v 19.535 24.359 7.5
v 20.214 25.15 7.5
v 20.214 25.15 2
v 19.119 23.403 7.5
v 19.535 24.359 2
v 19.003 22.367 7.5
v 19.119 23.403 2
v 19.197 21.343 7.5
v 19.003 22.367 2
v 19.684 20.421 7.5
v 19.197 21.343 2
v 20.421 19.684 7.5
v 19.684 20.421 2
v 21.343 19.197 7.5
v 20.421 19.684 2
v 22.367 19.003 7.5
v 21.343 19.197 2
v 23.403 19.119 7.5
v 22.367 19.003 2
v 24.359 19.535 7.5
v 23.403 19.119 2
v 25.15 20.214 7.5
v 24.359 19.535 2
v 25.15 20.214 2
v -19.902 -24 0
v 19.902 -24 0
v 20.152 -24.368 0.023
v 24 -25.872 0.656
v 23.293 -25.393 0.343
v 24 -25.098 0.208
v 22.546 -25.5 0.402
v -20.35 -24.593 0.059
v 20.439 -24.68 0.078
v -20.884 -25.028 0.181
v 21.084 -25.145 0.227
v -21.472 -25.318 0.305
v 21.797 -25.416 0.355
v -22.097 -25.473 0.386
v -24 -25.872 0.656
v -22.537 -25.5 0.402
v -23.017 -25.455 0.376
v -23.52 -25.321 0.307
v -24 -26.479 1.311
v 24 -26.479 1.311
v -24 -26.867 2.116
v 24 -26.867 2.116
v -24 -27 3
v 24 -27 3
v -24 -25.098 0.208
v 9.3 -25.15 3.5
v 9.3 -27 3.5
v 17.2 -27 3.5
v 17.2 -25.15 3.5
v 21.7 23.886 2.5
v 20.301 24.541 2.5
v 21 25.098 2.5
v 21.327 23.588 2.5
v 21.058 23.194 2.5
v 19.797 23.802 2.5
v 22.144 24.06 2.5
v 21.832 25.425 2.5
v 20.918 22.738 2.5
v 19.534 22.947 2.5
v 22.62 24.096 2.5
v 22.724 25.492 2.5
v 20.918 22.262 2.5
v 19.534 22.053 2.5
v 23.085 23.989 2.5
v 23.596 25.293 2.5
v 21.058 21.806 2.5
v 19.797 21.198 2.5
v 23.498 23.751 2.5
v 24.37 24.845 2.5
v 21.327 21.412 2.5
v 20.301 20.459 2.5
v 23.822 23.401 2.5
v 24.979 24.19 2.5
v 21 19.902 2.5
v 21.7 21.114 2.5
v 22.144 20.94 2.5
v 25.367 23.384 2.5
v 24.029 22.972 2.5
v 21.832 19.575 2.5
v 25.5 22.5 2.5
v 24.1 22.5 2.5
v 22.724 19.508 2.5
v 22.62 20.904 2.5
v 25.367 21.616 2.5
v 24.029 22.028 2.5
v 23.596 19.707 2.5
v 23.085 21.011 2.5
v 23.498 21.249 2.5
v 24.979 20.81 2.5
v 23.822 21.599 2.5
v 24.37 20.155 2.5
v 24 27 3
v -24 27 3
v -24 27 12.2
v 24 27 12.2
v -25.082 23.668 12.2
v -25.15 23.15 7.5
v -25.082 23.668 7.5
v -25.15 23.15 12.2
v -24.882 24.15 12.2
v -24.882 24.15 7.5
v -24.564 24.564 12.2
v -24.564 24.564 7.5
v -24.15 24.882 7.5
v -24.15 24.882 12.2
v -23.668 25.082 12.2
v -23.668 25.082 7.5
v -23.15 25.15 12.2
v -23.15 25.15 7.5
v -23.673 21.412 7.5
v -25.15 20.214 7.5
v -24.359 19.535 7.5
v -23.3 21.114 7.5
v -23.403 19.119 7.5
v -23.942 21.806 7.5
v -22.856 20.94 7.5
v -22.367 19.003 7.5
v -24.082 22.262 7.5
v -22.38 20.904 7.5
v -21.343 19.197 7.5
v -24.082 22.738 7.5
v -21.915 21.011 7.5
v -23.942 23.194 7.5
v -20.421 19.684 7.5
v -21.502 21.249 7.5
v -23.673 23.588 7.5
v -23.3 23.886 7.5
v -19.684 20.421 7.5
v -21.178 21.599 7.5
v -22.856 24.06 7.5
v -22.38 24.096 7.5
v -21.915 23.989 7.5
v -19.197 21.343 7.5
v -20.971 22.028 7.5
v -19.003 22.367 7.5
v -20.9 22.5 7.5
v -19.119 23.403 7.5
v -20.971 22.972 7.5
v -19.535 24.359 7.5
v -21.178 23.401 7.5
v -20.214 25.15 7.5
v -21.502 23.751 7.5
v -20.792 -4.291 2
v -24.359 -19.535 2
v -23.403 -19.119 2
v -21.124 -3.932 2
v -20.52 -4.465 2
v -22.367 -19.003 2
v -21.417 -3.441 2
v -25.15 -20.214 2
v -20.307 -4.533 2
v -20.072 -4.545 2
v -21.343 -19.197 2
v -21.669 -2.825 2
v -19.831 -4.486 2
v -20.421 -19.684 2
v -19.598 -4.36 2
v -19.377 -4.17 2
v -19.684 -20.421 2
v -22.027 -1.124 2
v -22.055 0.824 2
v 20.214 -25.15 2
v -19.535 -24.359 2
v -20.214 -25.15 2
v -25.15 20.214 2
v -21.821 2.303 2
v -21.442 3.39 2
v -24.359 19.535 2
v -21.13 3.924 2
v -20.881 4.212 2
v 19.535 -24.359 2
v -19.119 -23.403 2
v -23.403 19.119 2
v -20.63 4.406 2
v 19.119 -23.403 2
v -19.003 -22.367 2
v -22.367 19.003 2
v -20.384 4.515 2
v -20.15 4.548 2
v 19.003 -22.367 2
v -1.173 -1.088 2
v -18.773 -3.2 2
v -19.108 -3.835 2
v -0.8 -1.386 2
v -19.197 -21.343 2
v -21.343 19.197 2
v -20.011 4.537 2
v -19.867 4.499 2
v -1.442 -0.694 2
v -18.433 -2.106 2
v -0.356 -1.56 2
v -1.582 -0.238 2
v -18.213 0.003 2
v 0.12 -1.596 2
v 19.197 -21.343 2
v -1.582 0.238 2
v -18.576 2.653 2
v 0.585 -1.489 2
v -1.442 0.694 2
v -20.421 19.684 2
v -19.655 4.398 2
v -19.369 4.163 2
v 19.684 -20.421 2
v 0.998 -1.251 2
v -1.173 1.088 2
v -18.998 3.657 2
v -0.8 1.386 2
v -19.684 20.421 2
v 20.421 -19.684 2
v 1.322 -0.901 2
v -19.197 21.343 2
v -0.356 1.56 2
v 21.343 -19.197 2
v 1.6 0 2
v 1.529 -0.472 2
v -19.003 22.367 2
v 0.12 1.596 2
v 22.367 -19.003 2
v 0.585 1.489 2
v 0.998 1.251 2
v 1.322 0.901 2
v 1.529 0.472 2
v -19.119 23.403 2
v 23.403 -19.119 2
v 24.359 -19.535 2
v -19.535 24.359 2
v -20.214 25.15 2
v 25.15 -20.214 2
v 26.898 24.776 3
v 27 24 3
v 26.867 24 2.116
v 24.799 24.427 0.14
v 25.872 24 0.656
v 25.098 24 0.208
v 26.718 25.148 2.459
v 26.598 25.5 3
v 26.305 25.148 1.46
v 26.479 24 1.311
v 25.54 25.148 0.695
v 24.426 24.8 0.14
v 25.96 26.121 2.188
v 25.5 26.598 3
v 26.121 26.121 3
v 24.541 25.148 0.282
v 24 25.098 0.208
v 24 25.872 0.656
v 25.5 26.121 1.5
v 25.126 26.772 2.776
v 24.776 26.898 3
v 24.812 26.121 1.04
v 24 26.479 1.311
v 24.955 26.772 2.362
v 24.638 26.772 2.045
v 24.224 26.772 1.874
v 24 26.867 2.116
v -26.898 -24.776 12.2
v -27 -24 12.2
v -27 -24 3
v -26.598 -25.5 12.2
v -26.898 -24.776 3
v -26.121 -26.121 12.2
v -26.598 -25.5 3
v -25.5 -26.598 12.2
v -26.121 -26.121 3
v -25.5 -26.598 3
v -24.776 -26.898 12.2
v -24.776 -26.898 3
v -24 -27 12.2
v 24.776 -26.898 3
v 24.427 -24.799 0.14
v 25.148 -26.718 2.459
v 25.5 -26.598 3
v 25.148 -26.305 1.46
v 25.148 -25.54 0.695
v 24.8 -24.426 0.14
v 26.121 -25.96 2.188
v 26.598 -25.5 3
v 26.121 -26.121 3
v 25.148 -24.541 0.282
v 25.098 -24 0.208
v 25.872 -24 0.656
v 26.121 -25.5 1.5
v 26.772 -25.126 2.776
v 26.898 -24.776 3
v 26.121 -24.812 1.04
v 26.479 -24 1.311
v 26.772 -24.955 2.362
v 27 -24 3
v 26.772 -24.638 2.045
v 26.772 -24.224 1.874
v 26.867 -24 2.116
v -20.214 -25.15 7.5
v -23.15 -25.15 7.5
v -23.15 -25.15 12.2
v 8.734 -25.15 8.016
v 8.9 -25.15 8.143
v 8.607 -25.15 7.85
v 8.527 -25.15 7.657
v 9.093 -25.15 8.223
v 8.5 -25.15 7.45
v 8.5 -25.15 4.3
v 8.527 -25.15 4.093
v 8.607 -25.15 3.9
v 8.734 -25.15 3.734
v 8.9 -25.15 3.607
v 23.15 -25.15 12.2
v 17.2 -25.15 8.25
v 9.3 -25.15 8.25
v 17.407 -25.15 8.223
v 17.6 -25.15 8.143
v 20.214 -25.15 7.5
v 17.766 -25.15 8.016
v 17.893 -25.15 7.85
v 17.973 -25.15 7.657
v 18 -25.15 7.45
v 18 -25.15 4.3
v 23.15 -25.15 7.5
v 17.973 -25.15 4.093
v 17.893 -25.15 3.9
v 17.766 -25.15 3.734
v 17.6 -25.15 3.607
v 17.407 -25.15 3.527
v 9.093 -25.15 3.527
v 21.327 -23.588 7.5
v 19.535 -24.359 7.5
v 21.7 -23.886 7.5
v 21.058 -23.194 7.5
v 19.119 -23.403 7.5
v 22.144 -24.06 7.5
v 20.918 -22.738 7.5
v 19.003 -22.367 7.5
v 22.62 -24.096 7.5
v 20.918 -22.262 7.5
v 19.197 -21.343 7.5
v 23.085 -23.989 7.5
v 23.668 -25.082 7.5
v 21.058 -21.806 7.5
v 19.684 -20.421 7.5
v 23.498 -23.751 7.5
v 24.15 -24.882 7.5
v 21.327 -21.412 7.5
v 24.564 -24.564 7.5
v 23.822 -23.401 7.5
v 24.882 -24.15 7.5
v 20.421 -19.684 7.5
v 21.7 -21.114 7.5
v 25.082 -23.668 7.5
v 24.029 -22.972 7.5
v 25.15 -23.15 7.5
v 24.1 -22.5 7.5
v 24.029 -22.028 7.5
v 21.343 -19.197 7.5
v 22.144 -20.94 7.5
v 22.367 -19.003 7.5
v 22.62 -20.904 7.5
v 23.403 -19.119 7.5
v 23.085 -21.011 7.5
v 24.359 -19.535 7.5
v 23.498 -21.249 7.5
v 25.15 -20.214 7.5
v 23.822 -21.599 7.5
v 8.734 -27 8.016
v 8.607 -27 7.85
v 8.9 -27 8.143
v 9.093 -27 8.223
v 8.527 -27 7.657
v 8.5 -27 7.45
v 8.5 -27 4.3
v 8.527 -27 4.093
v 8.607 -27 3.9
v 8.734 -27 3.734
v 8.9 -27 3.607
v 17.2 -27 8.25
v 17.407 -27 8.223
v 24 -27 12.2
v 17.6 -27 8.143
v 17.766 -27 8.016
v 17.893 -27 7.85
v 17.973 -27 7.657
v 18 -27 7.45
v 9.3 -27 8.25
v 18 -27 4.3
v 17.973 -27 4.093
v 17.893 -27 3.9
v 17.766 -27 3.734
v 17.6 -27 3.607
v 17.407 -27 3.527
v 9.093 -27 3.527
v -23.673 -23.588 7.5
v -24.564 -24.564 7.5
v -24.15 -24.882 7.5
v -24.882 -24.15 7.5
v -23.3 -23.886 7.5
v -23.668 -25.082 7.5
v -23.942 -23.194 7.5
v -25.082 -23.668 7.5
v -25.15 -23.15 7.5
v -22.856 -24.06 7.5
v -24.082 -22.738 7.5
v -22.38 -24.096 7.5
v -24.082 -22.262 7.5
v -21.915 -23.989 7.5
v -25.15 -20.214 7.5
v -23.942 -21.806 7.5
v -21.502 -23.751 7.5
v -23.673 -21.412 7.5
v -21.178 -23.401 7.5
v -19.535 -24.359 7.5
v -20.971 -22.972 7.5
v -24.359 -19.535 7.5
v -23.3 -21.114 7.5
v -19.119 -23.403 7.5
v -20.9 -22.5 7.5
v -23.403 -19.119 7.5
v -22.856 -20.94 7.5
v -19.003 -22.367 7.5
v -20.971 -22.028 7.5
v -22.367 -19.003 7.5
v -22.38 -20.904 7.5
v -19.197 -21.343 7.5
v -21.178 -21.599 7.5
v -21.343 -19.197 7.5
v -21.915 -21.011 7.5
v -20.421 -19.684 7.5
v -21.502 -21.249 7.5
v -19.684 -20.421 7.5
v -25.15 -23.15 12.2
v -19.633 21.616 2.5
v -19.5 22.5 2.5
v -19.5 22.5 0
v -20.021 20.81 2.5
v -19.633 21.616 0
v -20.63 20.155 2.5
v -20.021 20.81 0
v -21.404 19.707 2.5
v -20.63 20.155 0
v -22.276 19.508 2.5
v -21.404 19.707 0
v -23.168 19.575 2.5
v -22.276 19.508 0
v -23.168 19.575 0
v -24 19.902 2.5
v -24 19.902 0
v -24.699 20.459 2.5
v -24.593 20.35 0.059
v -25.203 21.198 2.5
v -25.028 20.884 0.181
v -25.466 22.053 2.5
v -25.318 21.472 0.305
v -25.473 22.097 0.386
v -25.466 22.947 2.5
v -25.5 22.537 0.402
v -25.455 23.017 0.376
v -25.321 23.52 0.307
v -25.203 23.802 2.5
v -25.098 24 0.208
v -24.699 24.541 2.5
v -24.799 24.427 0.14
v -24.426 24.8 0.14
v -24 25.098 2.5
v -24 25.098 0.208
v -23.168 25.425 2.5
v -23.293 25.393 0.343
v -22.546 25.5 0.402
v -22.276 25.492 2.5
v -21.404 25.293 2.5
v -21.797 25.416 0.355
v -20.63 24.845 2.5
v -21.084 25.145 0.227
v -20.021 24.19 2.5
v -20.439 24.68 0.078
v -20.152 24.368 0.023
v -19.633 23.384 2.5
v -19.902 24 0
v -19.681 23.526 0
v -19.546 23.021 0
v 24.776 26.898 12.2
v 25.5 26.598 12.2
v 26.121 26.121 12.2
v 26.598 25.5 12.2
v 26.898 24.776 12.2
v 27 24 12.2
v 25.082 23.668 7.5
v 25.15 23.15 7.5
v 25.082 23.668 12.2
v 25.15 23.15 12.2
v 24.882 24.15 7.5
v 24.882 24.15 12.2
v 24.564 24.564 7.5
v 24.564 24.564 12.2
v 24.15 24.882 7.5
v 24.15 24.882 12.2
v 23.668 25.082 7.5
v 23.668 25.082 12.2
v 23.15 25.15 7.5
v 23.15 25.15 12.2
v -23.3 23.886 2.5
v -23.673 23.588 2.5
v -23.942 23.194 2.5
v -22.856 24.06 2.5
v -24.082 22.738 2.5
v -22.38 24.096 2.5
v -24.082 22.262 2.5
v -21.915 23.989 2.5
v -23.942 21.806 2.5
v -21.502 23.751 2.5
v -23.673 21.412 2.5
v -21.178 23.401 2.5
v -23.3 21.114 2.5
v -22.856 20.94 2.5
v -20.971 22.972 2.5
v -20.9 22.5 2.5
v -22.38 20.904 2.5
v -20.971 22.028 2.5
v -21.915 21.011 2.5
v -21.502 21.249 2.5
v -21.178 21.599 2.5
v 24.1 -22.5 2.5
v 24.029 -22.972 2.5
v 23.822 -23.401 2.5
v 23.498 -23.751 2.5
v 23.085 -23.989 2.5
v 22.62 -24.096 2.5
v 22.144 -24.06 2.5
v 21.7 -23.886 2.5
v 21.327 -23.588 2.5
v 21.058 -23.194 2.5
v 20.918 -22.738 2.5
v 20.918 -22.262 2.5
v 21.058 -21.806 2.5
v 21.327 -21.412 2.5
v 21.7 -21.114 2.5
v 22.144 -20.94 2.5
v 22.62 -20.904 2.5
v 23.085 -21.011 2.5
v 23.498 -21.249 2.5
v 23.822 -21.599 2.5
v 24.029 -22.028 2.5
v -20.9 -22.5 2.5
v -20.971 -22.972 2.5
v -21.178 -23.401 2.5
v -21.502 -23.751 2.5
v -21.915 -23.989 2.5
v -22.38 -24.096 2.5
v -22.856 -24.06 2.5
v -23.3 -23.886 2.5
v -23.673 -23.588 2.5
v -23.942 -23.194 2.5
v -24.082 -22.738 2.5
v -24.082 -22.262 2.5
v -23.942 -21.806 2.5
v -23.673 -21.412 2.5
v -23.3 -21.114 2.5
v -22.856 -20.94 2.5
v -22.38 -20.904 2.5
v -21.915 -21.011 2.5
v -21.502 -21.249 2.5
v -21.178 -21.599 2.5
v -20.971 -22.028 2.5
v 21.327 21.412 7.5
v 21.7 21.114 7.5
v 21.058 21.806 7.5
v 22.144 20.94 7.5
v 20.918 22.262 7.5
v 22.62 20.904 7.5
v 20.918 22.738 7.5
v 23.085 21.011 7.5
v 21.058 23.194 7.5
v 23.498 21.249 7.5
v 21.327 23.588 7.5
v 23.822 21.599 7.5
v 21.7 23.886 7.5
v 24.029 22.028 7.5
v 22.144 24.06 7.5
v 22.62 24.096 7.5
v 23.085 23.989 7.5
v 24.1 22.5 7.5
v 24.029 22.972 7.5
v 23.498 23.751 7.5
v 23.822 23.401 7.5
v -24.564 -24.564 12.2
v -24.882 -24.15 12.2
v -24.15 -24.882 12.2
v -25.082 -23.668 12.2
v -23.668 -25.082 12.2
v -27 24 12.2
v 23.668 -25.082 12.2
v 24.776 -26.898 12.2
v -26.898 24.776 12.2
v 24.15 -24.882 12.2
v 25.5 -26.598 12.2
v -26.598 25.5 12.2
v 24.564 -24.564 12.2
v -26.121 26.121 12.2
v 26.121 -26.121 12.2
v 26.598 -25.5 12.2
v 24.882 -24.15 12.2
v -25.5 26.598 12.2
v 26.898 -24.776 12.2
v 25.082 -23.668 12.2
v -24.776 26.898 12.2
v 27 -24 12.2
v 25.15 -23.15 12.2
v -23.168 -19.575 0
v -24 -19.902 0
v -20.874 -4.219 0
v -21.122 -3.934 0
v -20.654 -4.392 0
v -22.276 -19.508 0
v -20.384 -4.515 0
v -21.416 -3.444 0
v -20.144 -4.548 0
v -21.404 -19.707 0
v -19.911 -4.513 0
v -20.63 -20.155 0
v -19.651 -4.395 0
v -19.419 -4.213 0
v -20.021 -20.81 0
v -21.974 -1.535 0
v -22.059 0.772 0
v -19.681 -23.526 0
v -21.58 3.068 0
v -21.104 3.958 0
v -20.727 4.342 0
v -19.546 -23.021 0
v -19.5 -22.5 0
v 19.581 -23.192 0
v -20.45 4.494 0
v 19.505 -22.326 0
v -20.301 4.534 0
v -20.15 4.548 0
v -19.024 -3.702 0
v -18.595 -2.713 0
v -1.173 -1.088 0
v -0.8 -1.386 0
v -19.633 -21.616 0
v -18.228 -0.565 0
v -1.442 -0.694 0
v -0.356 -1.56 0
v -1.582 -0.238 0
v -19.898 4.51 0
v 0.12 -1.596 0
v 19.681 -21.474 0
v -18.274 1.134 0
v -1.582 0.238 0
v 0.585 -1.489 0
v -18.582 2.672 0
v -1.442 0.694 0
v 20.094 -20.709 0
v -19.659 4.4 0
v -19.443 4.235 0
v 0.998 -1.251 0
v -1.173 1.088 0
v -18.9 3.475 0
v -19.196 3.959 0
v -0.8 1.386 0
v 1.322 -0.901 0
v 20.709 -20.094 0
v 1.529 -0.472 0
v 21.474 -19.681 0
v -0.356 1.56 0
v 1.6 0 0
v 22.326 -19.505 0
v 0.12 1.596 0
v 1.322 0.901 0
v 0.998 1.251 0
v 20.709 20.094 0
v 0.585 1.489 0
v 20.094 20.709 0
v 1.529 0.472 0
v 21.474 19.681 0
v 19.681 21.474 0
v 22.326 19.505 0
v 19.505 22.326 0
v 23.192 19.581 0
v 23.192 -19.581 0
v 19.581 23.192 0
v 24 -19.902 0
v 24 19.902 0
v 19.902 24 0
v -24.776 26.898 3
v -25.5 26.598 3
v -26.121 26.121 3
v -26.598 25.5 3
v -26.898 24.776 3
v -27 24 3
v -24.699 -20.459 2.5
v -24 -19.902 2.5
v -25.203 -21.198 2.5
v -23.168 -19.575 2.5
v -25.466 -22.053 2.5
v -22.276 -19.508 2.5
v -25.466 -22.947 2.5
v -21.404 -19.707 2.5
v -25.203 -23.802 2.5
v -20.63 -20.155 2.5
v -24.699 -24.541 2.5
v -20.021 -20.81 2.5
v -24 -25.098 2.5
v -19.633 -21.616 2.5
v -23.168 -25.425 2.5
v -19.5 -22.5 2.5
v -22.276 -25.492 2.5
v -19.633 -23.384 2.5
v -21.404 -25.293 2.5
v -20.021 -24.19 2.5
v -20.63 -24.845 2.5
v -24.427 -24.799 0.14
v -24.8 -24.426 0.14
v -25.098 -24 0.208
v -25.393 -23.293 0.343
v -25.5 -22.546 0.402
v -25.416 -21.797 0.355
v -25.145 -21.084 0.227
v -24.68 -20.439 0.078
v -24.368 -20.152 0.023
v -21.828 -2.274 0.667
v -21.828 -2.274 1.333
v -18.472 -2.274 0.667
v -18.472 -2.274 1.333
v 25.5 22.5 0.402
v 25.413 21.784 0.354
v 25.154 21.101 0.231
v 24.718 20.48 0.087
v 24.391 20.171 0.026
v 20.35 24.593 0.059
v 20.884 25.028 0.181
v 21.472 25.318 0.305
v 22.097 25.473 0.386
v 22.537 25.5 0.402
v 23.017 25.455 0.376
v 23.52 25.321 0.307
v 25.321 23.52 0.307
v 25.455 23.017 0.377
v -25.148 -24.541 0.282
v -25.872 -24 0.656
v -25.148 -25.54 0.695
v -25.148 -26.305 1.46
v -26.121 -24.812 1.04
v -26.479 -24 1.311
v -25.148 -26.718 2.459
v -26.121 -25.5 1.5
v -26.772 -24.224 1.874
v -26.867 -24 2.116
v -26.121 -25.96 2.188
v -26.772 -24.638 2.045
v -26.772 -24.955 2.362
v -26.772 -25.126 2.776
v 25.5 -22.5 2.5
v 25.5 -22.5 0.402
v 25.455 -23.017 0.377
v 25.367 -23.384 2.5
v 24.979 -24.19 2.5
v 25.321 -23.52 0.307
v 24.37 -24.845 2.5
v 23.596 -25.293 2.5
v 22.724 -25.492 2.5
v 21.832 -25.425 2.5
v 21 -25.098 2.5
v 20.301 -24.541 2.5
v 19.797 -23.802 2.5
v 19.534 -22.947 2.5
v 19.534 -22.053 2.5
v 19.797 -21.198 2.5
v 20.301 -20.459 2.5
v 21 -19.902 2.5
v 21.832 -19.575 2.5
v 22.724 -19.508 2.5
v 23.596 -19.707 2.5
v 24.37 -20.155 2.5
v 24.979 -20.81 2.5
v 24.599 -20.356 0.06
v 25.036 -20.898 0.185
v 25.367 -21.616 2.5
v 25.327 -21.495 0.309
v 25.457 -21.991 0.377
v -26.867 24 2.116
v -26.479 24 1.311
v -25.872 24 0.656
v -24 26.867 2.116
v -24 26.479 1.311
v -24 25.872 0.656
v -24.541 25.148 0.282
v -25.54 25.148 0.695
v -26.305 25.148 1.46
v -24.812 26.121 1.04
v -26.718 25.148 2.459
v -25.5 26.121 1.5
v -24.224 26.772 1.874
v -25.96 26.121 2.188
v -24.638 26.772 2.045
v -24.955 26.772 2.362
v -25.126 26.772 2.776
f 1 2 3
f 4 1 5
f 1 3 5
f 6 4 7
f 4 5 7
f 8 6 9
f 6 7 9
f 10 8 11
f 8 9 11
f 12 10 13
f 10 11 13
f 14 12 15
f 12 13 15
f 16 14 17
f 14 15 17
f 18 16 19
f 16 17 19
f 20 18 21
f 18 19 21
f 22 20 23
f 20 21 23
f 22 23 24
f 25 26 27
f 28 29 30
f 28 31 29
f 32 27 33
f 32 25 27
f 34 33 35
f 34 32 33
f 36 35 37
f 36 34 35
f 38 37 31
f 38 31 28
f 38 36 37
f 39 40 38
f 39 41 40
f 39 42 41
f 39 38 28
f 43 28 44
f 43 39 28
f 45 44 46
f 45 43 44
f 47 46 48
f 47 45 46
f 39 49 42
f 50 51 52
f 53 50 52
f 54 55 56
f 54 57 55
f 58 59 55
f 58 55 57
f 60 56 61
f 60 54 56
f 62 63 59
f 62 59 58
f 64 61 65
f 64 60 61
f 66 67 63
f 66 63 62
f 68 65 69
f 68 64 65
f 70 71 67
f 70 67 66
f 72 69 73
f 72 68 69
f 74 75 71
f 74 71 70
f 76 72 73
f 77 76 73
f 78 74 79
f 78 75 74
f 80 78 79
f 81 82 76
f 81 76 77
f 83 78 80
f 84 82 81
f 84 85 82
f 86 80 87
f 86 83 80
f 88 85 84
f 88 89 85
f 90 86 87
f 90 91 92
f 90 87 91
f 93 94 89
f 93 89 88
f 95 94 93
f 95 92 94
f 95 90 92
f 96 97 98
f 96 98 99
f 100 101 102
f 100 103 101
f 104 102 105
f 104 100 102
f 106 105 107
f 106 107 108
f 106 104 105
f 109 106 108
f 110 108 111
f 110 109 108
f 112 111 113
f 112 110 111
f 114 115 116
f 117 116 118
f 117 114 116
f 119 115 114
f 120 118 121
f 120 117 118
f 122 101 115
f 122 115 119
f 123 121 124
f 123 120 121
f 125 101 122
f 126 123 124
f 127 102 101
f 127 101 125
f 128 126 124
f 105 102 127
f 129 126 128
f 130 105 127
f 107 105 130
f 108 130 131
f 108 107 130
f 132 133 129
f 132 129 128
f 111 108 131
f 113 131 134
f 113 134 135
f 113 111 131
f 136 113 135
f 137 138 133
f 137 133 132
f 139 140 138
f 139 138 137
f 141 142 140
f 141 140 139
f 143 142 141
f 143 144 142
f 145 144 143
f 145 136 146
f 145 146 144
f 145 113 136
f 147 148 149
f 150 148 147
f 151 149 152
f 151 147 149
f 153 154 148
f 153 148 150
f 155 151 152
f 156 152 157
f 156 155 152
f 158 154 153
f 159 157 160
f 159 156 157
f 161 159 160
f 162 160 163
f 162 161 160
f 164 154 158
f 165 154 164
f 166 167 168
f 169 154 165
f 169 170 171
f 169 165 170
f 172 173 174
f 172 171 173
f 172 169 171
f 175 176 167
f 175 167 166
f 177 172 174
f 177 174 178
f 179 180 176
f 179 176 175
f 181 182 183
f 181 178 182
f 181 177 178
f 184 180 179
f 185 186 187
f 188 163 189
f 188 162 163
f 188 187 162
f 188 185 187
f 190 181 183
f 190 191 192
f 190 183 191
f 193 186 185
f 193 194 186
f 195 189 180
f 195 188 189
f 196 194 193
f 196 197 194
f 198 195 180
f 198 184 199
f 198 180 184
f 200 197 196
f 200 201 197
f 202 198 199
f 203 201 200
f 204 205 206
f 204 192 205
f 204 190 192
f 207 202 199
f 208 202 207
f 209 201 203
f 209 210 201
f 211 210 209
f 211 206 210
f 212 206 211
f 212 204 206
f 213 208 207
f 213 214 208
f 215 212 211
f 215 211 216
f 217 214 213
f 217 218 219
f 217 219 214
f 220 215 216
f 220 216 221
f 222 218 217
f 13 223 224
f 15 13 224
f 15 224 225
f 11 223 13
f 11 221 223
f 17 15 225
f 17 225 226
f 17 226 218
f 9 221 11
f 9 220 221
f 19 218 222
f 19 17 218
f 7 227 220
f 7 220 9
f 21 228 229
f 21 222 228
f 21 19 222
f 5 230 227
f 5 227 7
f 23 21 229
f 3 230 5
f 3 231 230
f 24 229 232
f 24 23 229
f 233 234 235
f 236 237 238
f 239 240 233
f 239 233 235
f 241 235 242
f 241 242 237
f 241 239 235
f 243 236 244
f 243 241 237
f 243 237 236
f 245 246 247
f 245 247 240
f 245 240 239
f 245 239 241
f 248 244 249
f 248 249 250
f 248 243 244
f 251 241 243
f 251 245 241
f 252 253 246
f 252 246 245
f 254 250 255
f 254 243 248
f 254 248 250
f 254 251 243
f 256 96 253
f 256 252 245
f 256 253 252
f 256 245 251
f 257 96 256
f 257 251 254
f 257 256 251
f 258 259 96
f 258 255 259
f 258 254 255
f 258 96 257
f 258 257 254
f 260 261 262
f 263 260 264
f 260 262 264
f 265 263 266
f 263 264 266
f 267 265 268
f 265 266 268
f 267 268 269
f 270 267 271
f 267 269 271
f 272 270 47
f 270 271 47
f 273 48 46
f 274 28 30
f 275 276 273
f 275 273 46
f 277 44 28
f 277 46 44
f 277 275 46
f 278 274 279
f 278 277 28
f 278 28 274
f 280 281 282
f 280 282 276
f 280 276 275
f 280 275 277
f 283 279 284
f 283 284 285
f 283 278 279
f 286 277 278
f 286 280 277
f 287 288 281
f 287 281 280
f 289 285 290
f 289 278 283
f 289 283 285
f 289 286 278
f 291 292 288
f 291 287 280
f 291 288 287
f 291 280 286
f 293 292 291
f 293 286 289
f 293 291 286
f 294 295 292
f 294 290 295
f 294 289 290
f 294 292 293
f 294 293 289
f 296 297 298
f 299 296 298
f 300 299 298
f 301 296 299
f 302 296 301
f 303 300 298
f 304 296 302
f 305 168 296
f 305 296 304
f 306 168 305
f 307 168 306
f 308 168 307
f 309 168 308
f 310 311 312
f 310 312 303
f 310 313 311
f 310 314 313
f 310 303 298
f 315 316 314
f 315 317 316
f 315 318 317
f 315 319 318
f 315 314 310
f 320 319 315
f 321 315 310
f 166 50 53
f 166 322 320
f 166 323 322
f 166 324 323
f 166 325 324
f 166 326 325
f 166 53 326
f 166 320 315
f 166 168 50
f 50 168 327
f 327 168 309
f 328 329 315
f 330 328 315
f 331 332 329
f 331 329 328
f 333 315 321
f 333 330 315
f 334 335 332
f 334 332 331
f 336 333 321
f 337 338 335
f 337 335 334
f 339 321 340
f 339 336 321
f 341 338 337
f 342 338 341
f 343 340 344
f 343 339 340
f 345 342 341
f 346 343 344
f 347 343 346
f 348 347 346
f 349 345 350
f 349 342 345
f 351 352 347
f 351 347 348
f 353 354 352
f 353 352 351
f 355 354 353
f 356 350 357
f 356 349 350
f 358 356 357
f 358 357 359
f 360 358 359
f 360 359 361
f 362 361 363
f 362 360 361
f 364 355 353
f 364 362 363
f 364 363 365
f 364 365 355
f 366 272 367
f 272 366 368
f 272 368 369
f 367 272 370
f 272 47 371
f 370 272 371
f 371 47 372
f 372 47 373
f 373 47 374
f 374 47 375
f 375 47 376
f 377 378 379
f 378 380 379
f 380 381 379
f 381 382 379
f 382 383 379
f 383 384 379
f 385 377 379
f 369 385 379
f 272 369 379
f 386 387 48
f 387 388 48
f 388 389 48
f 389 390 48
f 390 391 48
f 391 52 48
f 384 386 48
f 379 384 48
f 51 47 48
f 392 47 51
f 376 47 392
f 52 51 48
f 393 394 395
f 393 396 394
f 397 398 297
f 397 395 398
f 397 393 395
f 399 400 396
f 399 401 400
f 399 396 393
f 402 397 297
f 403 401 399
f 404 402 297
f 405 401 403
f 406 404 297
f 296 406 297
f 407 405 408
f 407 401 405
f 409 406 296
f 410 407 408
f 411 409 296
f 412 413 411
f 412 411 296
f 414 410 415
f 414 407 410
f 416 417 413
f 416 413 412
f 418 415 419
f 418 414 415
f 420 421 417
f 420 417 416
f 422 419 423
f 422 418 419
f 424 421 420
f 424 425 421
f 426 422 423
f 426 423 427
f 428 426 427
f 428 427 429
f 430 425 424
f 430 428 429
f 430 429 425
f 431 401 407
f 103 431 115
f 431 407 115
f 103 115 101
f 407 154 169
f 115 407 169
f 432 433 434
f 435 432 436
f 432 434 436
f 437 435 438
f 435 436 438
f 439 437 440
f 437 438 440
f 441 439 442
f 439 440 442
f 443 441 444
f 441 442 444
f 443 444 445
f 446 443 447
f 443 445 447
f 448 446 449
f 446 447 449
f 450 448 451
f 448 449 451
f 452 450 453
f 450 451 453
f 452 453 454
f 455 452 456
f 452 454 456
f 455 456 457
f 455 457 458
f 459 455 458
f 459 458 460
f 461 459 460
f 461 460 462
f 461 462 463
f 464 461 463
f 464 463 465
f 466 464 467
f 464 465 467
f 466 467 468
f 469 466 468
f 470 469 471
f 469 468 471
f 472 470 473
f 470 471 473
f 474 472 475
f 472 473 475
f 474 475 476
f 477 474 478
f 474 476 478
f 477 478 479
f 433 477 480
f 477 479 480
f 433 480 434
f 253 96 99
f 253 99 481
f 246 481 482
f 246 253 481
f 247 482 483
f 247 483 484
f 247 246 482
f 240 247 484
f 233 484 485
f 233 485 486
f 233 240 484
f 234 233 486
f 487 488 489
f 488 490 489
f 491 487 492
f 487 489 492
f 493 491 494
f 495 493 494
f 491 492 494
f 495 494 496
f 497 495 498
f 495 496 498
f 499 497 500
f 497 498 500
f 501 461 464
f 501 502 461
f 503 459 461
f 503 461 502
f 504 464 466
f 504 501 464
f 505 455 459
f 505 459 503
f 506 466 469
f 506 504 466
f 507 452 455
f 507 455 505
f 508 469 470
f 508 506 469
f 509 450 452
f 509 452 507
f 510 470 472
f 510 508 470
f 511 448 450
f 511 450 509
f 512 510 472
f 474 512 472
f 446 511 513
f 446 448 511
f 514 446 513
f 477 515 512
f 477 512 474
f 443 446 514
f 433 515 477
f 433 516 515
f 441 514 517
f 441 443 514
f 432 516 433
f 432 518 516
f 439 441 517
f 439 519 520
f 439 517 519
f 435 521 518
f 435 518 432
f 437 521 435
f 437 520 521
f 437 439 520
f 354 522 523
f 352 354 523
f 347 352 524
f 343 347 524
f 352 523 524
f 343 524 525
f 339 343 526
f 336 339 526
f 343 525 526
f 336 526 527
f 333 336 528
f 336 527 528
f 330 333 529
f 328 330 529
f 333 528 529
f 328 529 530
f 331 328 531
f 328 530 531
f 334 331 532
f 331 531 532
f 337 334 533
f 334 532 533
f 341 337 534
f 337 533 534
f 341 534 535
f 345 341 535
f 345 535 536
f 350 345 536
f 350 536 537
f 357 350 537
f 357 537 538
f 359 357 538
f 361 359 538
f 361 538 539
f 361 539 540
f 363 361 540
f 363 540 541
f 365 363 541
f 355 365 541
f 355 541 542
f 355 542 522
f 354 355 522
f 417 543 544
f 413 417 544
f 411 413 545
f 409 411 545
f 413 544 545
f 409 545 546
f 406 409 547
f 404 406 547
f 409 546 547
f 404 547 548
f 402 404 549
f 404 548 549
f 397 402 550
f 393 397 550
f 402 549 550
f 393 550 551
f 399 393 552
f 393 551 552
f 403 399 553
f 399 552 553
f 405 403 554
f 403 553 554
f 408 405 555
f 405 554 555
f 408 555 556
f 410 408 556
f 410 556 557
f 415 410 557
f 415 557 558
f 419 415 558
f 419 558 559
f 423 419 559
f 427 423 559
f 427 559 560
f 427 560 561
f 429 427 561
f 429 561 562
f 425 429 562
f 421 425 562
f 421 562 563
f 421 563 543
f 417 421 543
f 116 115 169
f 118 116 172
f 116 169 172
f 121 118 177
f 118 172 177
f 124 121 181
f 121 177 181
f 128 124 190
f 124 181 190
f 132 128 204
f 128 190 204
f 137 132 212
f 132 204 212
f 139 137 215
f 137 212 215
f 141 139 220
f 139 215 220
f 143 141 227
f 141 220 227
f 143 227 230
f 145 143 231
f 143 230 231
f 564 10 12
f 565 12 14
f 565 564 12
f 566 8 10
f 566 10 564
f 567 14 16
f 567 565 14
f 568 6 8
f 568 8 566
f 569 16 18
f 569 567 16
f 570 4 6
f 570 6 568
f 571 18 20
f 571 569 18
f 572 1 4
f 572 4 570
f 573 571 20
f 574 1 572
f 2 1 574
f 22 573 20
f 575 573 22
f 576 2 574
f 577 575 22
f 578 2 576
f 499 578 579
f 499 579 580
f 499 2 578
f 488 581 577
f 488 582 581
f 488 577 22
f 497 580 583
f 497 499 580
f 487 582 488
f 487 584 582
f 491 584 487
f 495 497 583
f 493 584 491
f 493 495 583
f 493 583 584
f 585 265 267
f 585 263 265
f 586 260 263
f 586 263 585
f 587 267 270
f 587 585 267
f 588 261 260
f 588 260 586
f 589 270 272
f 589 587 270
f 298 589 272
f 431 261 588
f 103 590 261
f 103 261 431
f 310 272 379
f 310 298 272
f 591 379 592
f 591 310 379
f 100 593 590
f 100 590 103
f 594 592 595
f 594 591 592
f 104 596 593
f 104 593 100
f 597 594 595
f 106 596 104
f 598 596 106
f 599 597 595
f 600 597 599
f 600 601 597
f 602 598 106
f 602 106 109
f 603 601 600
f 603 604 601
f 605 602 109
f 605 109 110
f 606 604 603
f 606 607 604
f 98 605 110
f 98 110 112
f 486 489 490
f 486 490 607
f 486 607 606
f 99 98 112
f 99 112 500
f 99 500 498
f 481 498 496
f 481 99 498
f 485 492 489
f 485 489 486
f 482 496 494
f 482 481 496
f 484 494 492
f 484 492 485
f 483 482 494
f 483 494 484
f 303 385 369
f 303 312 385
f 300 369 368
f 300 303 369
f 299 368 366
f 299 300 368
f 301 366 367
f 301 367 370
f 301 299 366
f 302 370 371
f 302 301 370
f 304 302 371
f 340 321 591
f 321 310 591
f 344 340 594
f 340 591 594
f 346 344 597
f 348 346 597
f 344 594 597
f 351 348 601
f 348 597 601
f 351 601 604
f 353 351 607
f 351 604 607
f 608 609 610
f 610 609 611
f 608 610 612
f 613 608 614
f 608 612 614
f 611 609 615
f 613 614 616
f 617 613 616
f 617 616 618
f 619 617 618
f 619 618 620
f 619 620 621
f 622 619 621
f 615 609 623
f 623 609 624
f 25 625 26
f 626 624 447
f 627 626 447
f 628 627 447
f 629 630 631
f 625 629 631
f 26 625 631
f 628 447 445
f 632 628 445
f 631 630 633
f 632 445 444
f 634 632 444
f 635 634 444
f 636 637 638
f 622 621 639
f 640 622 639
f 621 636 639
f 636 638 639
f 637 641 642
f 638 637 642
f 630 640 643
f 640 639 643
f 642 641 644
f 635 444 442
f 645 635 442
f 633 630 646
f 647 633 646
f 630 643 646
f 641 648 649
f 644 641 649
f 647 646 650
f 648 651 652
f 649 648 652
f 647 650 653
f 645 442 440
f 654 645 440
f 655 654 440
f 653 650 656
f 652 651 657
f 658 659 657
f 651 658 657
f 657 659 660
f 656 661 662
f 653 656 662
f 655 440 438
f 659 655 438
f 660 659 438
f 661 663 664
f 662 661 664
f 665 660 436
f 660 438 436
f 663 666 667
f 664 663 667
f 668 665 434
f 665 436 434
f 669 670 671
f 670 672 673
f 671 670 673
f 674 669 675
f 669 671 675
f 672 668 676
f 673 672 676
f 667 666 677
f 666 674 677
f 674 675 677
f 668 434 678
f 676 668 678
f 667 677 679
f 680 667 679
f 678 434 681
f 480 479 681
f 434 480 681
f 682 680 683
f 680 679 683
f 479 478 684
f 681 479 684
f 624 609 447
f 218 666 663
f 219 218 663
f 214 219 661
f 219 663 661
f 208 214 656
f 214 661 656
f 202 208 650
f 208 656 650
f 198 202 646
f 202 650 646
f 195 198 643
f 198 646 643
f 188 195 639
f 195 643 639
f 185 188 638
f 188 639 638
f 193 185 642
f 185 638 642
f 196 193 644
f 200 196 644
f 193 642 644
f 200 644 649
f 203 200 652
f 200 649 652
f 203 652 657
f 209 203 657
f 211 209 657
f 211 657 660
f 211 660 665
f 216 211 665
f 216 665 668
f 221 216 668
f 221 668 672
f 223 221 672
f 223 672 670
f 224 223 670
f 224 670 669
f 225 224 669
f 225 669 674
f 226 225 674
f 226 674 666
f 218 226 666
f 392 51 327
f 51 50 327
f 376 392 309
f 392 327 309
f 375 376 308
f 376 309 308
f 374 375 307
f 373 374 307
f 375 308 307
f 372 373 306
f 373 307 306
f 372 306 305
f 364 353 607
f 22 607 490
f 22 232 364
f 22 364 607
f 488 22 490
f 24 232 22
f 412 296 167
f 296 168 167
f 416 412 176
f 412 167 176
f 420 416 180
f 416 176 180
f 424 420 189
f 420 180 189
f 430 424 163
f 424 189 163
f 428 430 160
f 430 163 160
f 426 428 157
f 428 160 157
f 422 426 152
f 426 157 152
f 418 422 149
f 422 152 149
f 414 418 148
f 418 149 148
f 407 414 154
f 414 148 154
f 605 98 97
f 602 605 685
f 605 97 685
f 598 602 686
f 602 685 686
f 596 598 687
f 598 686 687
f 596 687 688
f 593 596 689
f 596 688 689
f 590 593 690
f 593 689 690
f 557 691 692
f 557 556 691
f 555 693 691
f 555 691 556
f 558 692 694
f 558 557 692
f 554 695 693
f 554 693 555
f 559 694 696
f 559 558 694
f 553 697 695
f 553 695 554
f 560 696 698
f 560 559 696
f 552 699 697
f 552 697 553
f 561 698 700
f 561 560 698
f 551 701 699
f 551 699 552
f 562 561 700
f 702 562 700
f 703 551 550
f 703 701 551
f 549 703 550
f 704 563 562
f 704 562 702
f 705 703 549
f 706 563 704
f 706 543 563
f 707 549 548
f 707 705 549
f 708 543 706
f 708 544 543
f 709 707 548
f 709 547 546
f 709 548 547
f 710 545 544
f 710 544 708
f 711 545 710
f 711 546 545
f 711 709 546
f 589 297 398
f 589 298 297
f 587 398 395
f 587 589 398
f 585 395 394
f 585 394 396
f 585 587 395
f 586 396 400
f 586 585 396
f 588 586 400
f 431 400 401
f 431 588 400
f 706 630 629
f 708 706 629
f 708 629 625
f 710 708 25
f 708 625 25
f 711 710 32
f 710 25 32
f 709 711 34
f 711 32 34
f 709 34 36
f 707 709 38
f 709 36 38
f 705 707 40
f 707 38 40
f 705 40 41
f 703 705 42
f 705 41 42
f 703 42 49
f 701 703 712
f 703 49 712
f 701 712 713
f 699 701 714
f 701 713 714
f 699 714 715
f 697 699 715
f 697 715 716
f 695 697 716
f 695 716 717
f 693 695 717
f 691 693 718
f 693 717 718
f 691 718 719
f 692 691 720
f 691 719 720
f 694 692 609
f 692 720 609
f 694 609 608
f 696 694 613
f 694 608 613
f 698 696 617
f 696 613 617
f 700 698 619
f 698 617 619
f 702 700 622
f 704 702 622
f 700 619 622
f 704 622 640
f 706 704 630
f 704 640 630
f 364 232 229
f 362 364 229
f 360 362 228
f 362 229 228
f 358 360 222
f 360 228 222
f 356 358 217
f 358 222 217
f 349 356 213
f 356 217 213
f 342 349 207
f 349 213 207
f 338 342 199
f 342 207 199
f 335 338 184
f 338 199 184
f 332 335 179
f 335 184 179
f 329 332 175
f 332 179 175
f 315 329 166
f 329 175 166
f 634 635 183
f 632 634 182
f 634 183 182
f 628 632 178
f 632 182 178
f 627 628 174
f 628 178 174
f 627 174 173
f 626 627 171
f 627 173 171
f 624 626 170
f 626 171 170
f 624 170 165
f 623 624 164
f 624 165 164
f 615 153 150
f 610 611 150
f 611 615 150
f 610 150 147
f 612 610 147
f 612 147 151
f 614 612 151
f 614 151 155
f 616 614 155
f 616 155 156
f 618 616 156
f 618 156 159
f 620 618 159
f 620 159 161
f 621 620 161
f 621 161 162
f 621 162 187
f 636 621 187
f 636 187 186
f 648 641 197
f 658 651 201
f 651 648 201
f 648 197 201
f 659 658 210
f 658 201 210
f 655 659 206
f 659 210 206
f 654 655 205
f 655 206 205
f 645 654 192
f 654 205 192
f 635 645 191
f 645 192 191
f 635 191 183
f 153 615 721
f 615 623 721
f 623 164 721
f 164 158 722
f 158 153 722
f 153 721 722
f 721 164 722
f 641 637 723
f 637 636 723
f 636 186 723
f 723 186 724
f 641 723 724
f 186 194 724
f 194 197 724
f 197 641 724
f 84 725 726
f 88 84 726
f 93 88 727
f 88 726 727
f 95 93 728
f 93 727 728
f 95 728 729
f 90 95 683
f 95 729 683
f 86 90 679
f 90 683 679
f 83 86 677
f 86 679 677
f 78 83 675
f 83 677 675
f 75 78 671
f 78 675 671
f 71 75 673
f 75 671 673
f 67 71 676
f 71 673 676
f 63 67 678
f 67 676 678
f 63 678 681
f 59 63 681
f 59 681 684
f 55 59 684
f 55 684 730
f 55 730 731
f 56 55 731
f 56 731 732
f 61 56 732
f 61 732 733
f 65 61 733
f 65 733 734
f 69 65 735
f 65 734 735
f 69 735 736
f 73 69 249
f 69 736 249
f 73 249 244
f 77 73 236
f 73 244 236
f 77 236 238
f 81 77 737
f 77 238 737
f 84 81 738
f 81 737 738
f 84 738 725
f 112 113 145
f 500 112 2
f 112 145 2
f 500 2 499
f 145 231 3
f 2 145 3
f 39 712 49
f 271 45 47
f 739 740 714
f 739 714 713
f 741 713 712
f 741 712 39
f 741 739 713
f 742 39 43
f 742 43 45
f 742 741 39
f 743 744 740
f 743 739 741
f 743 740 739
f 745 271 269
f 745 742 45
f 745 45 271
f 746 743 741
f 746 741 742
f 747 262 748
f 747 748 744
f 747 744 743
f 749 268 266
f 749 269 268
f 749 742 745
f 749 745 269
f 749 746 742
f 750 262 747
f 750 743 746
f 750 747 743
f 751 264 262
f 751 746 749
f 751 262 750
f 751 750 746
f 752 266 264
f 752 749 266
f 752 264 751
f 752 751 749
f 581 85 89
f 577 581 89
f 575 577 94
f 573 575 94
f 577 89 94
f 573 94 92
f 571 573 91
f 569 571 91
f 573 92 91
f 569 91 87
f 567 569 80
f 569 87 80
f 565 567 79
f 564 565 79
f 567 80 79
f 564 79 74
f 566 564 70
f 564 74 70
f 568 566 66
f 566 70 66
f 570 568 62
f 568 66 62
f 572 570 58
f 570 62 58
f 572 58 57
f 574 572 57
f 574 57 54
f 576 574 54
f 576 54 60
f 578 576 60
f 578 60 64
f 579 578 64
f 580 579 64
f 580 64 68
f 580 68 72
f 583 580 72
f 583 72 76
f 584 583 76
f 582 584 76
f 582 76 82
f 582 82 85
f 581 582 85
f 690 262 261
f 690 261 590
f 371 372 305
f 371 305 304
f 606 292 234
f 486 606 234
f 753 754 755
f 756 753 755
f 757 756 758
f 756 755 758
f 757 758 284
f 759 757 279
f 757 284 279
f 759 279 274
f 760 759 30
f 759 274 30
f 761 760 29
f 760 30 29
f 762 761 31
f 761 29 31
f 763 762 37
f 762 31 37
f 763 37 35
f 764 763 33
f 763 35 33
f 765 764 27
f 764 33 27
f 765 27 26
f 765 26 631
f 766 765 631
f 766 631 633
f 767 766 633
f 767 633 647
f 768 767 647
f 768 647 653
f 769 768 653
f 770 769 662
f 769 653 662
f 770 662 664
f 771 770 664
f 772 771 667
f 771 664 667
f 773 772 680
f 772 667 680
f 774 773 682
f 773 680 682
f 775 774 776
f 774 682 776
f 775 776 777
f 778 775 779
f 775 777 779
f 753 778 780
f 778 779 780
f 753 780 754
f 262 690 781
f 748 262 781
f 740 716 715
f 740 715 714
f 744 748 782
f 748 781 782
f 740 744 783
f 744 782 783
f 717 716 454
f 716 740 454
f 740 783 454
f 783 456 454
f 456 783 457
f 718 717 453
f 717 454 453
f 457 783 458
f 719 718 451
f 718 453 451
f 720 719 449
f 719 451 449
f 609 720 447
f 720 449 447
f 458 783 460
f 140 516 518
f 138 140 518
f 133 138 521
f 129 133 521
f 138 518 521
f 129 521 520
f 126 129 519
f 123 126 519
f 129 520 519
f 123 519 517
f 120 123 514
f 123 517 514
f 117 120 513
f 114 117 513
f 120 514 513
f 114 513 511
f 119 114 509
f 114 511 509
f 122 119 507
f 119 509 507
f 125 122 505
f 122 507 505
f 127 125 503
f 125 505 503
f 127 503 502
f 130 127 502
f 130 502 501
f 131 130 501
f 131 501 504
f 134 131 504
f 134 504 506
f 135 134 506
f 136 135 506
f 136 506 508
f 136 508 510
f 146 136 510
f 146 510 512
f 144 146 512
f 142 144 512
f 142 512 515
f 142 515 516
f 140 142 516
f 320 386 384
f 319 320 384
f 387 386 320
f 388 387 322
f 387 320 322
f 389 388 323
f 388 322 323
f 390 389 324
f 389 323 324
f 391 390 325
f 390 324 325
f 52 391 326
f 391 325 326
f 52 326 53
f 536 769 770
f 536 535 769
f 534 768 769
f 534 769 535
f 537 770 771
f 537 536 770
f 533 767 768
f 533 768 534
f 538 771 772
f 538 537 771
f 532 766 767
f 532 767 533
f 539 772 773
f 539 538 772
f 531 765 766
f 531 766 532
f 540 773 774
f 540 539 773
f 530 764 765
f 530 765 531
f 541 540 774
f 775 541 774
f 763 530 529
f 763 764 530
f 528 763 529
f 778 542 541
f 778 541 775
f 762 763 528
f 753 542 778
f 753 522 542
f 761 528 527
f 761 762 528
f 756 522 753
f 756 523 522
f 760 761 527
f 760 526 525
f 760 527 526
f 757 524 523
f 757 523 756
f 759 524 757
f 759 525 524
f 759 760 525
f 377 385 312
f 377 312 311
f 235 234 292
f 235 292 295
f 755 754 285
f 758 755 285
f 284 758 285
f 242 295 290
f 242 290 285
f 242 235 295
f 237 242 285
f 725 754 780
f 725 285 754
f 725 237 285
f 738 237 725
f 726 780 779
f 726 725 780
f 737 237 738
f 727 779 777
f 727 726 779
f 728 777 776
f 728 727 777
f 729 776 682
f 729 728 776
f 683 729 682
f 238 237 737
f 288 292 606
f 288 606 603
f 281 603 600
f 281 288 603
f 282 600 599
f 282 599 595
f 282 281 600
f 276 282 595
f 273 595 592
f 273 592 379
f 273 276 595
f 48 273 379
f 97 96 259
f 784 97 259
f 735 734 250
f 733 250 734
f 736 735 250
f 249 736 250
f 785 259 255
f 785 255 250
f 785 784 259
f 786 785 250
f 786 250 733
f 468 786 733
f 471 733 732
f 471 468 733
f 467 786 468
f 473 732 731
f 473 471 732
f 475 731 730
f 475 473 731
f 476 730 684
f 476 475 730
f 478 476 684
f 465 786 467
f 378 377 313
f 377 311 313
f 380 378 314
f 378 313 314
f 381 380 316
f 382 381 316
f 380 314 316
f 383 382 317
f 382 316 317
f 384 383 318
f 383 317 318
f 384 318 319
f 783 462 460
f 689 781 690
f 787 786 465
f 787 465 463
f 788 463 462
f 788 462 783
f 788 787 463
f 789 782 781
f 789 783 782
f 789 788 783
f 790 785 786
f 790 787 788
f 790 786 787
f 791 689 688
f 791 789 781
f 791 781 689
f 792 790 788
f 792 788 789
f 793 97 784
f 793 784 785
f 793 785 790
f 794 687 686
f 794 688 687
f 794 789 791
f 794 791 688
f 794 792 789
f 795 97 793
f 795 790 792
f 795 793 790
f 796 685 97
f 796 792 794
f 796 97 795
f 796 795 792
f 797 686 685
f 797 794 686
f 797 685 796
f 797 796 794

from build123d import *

# Parameters (mm, degrees)
F0_W          = 54
F0_H          = 54
F1_DEPTH      = 2
F2_W          = 54
F2_H          = 54
F2_W_2        = 50.3
F2_H_2        = 50.3
F3_DEPTH      = 10.2
F4_R          = 3.5
F5_DEPTH      = 5.5
F6_R          = 1.6
F7_DEPTH      = 25
F8_W          = 9.5
F8_H          = 4.75
F9_DEPTH      = 25
F11_DEPTH     = 25
F12_T1_DEPTH  = 48
F12_T3_DEPTH  = 48
F12_T5_DEPTH  = 16.7
F12_S9_W      = 3
F12_S9_H      = 3
F12_T10_DEPTH = 3
F12_S15_W     = 3
F12_S15_H     = 3
F12_T16_DEPTH = 3
F12_S21_W     = 3
F12_S21_H     = 3
F12_T22_DEPTH = 3
F12_S27_W     = 3
F12_S27_H     = 3
F12_T28_DEPTH = 3
F13_R         = 3
F14_DEPTH     = 2.5
F15_R         = 0.8
F16_R         = 2


# Not quite as in the source:
# - a fillet or chamfer that OpenCascade refuses, or shapes differently, is made with other operations: its cross-section is extruded or revolved along the edge and cut away or added


with BuildPart() as f1:
    # F0 (on Top) → F1 (new body)
    with BuildSketch(Plane.XY):
        Rectangle(F0_W, F0_H)
    extrude(amount=F1_DEPTH)

    # F2 (on face) → F3 (join)
    with BuildSketch(Plane.XY.offset(2)):
        Rectangle(F2_W, F2_H)
        Rectangle(F2_W_2, F2_H_2, mode=Mode.SUBTRACT)
    extrude(amount=F3_DEPTH)

    # F4 (on face) → F5 (join)
    with BuildSketch(Plane.XY.offset(2)):
        with Locations((-22.5, 22.5)):
            Circle(F4_R)
        with Locations((22.5, 22.5)):
            Circle(F4_R)
        with Locations((22.5, -22.5)):
            Circle(F4_R)
        with Locations((-22.5, -22.5)):
            Circle(F4_R)
    extrude(amount=F5_DEPTH)

    # F6 (on face) → F7 (cut)
    with BuildSketch(Plane(origin=(0, 0, 0), x_dir=(1, 0, 0), z_dir=(0, 0, -1))):
        with Locations((-22.5, 22.5)):
            Circle(F6_R)
        with Locations((22.5, 22.5)):
            Circle(F6_R)
        with Locations((22.5, -22.5)):
            Circle(F6_R)
        with Locations((-22.5, -22.5)):
            Circle(F6_R)
        Circle(F6_R)
    extrude(amount=-F7_DEPTH, mode=Mode.SUBTRACT)

    # F8 (on face) → F9 (cut)
    with BuildSketch(Plane.XZ.offset(27)):
        with Locations((13.25, 5.875)):
            Rectangle(F8_W, F8_H)
    extrude(amount=-F9_DEPTH, mode=Mode.SUBTRACT)

    # F10 (on face) → F11 (cut)
    with BuildSketch(Plane.XY.offset(2)):
        with BuildLine():
            add(Edge.make_bspline(
                [(-20.15, 4.5483106502), (-23.5056844979, 4.5483106502), (-21.827842249, -2.2741553251), (-20.15, -9.0966213004), (-18.472157751, -2.2741553251), (-16.7943155021, 4.5483106502), (-20.15, 4.5483106502)],
                knots=[0, 0, 0, 2.0943951024, 2.0943951024, 4.1887902048, 4.1887902048, 6.2831853072, 6.2831853072, 6.2831853072], degree=2, weights=[1, 0.5, 1, 0.5, 1, 0.5, 1]))
        make_face()
    extrude(amount=-F11_DEPTH, mode=Mode.SUBTRACT)

    # F12: fillet of radius 3 on 8 edges, made by hand

    # F12_s2 → F12_t1 (cut)
    with BuildSketch(Plane.YZ.offset(-24)):
        with BuildLine():
            ThreePointArc((-24, 0), (-26.1213203436, 0.8786796564), (-27, 3))
            Line((-27, 3), (-27, 0))
            Line((-27, 0), (-24, 0))
        make_face()
        with BuildLine():
            ThreePointArc((27, 3), (26.1213203436, 0.8786796564), (24, 0))
            Line((24, 0), (27, 0))
            Line((27, 0), (27, 3))
        make_face()
    extrude(amount=F12_T1_DEPTH, mode=Mode.SUBTRACT)

    # F12_s4 → F12_t3 (cut)
    with BuildSketch(Plane.XZ.offset(-24)):
        with BuildLine():
            ThreePointArc((-27, 3), (-26.1213203436, 0.8786796564), (-24, 0))
            Line((-24, 0), (-27, 0))
            Line((-27, 0), (-27, 3))
        make_face()
        with BuildLine():
            ThreePointArc((27, 3), (26.1213203436, 0.8786796564), (24, 0))
            Line((24, 0), (27, 0))
            Line((27, 0), (27, 3))
        make_face()
    extrude(amount=F12_T3_DEPTH, mode=Mode.SUBTRACT)

    # F12_s6 → F12_t5 (cut)
    with BuildSketch(Plane.XY.offset(3)):
        with BuildLine():
            ThreePointArc((27, -24), (26.1213203436, -26.1213203436), (24, -27))
            Line((24, -27), (27, -27))
            Line((27, -27), (27, -24))
        make_face()
        with BuildLine():
            ThreePointArc((-27, -24), (-26.1213203436, -26.1213203436), (-24, -27))
            Line((-24, -27), (-27, -27))
            Line((-27, -27), (-27, -24))
        make_face()
        with BuildLine():
            ThreePointArc((-24, 27), (-26.1213203436, 26.1213203436), (-27, 24))
            Line((-27, 24), (-27, 27))
            Line((-27, 27), (-24, 27))
        make_face()
        with BuildLine():
            ThreePointArc((24, 27), (26.1213203436, 26.1213203436), (27, 24))
            Line((27, 24), (27, 27))
            Line((27, 27), (24, 27))
        make_face()
    extrude(amount=F12_T5_DEPTH, mode=Mode.SUBTRACT)


with BuildPart() as f12_tool8:
    # F12_s9 → F12_t10 (new body)
    with BuildSketch(Plane.YZ.offset(-24)):
        with Locations((-25.5, 1.5)):
            Rectangle(F12_S9_W, F12_S9_H)
    extrude(amount=-F12_T10_DEPTH)

    # F12_s11 → F12_t12 (revolve, cut)
    with BuildSketch(Plane(origin=(-24, -24, 3), x_dir=(0, 0.7071067812, 0.7071067812), z_dir=(0, -0.7071067812, 0.7071067812))):
        with BuildLine():
            ThreePointArc((0, -3), (3, 0), (0, 3))
            Line((0, 3), (0, -3))
        make_face()
    revolve(axis=Axis((-24, -24, 3), (-1, 0, 0)), mode=Mode.SUBTRACT)


with BuildPart() as f1_1:
    add(f1.part)

    # F12_t7: cut F12_tool8
    add(f12_tool8.part, mode=Mode.SUBTRACT)


with BuildPart() as f12_tool14:
    # F12_s15 → F12_t16 (new body)
    with BuildSketch(Plane.YZ.offset(24)):
        with Locations((-25.5, 1.5)):
            Rectangle(F12_S15_W, F12_S15_H)
    extrude(amount=F12_T16_DEPTH)

    # F12_s17 → F12_t18 (revolve, cut)
    with BuildSketch(Plane(origin=(24, -24, 3), x_dir=(0, 0.7071067812, 0.7071067812), z_dir=(0, 0.7071067812, -0.7071067812))):
        with BuildLine():
            ThreePointArc((0, -3), (3, 0), (0, 3))
            Line((0, 3), (0, -3))
        make_face()
    revolve(axis=Axis((24, -24, 3), (1, 0, 0)), mode=Mode.SUBTRACT)


with BuildPart() as f1_2:
    add(f1_1.part)

    # F12_t13: cut F12_tool14
    add(f12_tool14.part, mode=Mode.SUBTRACT)


with BuildPart() as f12_tool20:
    # F12_s21 → F12_t22 (new body)
    with BuildSketch(Plane.XZ.offset(-24)):
        with Locations((-25.5, 1.5)):
            Rectangle(F12_S21_W, F12_S21_H)
    extrude(amount=-F12_T22_DEPTH)

    # F12_s23 → F12_t24 (revolve, cut)
    with BuildSketch(Plane(origin=(-24, 24, 3), x_dir=(0.7071067812, 0, 0.7071067812), z_dir=(-0.7071067812, 0, 0.7071067812))):
        with BuildLine():
            ThreePointArc((0, -3), (3, 0), (0, 3))
            Line((0, 3), (0, -3))
        make_face()
    revolve(axis=Axis((-24, 24, 3), (0, 1, 0)), mode=Mode.SUBTRACT)


with BuildPart() as f1_3:
    add(f1_2.part)

    # F12_t19: cut F12_tool20
    add(f12_tool20.part, mode=Mode.SUBTRACT)


with BuildPart() as f12_tool26:
    # F12_s27 → F12_t28 (new body)
    with BuildSketch(Plane.XZ.offset(-24)):
        with Locations((25.5, 1.5)):
            Rectangle(F12_S27_W, F12_S27_H)
    extrude(amount=-F12_T28_DEPTH)

    # F12_s29 → F12_t30 (revolve, cut)
    with BuildSketch(Plane(origin=(24, 24, 3), x_dir=(-0.7071067812, 0, 0.7071067812), z_dir=(-0.7071067812, 0, -0.7071067812))):
        with BuildLine():
            ThreePointArc((0, -3), (3, 0), (0, 3))
            Line((0, 3), (0, -3))
        make_face()
    revolve(axis=Axis((24, 24, 3), (0, 1, 0)), mode=Mode.SUBTRACT)


with BuildPart() as f1_4:
    add(f1_3.part)

    # F12_t25: cut F12_tool26
    add(f12_tool26.part, mode=Mode.SUBTRACT)

    # F13 (on face) → F14 (cut)
    with BuildSketch(Plane(origin=(0, 0, 0), x_dir=(1, 0, 0), z_dir=(0, 0, -1))):
        with Locations((-22.5, 22.5)):
            Circle(F13_R)
        with Locations((22.5, 22.5)):
            Circle(F13_R)
        with Locations((22.5, -22.5)):
            Circle(F13_R)
        with Locations((-22.5, -22.5)):
            Circle(F13_R)
    extrude(amount=-F14_DEPTH, mode=Mode.SUBTRACT)

    # F15
    f15_edges = [f1_4.edges().sort_by_distance(p)[0] for p in [
        (8.5, -26.075, 8.25),
        (8.5, -26.075, 3.5),
        (18, -26.075, 3.5),
        (18, -26.075, 8.25),
    ]]
    fillet(f15_edges, radius=F15_R)

    # F16
    f16_edges = [f1_4.edges().sort_by_distance(p)[0] for p in [
        (-25.15, 25.15, 7.1),
        (25.15, 25.15, 7.1),
        (-25.15, -25.15, 7.1),
        (25.15, -25.15, 7.1),
    ]]
    fillet(f16_edges, radius=F16_R)


solid = f1_4.part
